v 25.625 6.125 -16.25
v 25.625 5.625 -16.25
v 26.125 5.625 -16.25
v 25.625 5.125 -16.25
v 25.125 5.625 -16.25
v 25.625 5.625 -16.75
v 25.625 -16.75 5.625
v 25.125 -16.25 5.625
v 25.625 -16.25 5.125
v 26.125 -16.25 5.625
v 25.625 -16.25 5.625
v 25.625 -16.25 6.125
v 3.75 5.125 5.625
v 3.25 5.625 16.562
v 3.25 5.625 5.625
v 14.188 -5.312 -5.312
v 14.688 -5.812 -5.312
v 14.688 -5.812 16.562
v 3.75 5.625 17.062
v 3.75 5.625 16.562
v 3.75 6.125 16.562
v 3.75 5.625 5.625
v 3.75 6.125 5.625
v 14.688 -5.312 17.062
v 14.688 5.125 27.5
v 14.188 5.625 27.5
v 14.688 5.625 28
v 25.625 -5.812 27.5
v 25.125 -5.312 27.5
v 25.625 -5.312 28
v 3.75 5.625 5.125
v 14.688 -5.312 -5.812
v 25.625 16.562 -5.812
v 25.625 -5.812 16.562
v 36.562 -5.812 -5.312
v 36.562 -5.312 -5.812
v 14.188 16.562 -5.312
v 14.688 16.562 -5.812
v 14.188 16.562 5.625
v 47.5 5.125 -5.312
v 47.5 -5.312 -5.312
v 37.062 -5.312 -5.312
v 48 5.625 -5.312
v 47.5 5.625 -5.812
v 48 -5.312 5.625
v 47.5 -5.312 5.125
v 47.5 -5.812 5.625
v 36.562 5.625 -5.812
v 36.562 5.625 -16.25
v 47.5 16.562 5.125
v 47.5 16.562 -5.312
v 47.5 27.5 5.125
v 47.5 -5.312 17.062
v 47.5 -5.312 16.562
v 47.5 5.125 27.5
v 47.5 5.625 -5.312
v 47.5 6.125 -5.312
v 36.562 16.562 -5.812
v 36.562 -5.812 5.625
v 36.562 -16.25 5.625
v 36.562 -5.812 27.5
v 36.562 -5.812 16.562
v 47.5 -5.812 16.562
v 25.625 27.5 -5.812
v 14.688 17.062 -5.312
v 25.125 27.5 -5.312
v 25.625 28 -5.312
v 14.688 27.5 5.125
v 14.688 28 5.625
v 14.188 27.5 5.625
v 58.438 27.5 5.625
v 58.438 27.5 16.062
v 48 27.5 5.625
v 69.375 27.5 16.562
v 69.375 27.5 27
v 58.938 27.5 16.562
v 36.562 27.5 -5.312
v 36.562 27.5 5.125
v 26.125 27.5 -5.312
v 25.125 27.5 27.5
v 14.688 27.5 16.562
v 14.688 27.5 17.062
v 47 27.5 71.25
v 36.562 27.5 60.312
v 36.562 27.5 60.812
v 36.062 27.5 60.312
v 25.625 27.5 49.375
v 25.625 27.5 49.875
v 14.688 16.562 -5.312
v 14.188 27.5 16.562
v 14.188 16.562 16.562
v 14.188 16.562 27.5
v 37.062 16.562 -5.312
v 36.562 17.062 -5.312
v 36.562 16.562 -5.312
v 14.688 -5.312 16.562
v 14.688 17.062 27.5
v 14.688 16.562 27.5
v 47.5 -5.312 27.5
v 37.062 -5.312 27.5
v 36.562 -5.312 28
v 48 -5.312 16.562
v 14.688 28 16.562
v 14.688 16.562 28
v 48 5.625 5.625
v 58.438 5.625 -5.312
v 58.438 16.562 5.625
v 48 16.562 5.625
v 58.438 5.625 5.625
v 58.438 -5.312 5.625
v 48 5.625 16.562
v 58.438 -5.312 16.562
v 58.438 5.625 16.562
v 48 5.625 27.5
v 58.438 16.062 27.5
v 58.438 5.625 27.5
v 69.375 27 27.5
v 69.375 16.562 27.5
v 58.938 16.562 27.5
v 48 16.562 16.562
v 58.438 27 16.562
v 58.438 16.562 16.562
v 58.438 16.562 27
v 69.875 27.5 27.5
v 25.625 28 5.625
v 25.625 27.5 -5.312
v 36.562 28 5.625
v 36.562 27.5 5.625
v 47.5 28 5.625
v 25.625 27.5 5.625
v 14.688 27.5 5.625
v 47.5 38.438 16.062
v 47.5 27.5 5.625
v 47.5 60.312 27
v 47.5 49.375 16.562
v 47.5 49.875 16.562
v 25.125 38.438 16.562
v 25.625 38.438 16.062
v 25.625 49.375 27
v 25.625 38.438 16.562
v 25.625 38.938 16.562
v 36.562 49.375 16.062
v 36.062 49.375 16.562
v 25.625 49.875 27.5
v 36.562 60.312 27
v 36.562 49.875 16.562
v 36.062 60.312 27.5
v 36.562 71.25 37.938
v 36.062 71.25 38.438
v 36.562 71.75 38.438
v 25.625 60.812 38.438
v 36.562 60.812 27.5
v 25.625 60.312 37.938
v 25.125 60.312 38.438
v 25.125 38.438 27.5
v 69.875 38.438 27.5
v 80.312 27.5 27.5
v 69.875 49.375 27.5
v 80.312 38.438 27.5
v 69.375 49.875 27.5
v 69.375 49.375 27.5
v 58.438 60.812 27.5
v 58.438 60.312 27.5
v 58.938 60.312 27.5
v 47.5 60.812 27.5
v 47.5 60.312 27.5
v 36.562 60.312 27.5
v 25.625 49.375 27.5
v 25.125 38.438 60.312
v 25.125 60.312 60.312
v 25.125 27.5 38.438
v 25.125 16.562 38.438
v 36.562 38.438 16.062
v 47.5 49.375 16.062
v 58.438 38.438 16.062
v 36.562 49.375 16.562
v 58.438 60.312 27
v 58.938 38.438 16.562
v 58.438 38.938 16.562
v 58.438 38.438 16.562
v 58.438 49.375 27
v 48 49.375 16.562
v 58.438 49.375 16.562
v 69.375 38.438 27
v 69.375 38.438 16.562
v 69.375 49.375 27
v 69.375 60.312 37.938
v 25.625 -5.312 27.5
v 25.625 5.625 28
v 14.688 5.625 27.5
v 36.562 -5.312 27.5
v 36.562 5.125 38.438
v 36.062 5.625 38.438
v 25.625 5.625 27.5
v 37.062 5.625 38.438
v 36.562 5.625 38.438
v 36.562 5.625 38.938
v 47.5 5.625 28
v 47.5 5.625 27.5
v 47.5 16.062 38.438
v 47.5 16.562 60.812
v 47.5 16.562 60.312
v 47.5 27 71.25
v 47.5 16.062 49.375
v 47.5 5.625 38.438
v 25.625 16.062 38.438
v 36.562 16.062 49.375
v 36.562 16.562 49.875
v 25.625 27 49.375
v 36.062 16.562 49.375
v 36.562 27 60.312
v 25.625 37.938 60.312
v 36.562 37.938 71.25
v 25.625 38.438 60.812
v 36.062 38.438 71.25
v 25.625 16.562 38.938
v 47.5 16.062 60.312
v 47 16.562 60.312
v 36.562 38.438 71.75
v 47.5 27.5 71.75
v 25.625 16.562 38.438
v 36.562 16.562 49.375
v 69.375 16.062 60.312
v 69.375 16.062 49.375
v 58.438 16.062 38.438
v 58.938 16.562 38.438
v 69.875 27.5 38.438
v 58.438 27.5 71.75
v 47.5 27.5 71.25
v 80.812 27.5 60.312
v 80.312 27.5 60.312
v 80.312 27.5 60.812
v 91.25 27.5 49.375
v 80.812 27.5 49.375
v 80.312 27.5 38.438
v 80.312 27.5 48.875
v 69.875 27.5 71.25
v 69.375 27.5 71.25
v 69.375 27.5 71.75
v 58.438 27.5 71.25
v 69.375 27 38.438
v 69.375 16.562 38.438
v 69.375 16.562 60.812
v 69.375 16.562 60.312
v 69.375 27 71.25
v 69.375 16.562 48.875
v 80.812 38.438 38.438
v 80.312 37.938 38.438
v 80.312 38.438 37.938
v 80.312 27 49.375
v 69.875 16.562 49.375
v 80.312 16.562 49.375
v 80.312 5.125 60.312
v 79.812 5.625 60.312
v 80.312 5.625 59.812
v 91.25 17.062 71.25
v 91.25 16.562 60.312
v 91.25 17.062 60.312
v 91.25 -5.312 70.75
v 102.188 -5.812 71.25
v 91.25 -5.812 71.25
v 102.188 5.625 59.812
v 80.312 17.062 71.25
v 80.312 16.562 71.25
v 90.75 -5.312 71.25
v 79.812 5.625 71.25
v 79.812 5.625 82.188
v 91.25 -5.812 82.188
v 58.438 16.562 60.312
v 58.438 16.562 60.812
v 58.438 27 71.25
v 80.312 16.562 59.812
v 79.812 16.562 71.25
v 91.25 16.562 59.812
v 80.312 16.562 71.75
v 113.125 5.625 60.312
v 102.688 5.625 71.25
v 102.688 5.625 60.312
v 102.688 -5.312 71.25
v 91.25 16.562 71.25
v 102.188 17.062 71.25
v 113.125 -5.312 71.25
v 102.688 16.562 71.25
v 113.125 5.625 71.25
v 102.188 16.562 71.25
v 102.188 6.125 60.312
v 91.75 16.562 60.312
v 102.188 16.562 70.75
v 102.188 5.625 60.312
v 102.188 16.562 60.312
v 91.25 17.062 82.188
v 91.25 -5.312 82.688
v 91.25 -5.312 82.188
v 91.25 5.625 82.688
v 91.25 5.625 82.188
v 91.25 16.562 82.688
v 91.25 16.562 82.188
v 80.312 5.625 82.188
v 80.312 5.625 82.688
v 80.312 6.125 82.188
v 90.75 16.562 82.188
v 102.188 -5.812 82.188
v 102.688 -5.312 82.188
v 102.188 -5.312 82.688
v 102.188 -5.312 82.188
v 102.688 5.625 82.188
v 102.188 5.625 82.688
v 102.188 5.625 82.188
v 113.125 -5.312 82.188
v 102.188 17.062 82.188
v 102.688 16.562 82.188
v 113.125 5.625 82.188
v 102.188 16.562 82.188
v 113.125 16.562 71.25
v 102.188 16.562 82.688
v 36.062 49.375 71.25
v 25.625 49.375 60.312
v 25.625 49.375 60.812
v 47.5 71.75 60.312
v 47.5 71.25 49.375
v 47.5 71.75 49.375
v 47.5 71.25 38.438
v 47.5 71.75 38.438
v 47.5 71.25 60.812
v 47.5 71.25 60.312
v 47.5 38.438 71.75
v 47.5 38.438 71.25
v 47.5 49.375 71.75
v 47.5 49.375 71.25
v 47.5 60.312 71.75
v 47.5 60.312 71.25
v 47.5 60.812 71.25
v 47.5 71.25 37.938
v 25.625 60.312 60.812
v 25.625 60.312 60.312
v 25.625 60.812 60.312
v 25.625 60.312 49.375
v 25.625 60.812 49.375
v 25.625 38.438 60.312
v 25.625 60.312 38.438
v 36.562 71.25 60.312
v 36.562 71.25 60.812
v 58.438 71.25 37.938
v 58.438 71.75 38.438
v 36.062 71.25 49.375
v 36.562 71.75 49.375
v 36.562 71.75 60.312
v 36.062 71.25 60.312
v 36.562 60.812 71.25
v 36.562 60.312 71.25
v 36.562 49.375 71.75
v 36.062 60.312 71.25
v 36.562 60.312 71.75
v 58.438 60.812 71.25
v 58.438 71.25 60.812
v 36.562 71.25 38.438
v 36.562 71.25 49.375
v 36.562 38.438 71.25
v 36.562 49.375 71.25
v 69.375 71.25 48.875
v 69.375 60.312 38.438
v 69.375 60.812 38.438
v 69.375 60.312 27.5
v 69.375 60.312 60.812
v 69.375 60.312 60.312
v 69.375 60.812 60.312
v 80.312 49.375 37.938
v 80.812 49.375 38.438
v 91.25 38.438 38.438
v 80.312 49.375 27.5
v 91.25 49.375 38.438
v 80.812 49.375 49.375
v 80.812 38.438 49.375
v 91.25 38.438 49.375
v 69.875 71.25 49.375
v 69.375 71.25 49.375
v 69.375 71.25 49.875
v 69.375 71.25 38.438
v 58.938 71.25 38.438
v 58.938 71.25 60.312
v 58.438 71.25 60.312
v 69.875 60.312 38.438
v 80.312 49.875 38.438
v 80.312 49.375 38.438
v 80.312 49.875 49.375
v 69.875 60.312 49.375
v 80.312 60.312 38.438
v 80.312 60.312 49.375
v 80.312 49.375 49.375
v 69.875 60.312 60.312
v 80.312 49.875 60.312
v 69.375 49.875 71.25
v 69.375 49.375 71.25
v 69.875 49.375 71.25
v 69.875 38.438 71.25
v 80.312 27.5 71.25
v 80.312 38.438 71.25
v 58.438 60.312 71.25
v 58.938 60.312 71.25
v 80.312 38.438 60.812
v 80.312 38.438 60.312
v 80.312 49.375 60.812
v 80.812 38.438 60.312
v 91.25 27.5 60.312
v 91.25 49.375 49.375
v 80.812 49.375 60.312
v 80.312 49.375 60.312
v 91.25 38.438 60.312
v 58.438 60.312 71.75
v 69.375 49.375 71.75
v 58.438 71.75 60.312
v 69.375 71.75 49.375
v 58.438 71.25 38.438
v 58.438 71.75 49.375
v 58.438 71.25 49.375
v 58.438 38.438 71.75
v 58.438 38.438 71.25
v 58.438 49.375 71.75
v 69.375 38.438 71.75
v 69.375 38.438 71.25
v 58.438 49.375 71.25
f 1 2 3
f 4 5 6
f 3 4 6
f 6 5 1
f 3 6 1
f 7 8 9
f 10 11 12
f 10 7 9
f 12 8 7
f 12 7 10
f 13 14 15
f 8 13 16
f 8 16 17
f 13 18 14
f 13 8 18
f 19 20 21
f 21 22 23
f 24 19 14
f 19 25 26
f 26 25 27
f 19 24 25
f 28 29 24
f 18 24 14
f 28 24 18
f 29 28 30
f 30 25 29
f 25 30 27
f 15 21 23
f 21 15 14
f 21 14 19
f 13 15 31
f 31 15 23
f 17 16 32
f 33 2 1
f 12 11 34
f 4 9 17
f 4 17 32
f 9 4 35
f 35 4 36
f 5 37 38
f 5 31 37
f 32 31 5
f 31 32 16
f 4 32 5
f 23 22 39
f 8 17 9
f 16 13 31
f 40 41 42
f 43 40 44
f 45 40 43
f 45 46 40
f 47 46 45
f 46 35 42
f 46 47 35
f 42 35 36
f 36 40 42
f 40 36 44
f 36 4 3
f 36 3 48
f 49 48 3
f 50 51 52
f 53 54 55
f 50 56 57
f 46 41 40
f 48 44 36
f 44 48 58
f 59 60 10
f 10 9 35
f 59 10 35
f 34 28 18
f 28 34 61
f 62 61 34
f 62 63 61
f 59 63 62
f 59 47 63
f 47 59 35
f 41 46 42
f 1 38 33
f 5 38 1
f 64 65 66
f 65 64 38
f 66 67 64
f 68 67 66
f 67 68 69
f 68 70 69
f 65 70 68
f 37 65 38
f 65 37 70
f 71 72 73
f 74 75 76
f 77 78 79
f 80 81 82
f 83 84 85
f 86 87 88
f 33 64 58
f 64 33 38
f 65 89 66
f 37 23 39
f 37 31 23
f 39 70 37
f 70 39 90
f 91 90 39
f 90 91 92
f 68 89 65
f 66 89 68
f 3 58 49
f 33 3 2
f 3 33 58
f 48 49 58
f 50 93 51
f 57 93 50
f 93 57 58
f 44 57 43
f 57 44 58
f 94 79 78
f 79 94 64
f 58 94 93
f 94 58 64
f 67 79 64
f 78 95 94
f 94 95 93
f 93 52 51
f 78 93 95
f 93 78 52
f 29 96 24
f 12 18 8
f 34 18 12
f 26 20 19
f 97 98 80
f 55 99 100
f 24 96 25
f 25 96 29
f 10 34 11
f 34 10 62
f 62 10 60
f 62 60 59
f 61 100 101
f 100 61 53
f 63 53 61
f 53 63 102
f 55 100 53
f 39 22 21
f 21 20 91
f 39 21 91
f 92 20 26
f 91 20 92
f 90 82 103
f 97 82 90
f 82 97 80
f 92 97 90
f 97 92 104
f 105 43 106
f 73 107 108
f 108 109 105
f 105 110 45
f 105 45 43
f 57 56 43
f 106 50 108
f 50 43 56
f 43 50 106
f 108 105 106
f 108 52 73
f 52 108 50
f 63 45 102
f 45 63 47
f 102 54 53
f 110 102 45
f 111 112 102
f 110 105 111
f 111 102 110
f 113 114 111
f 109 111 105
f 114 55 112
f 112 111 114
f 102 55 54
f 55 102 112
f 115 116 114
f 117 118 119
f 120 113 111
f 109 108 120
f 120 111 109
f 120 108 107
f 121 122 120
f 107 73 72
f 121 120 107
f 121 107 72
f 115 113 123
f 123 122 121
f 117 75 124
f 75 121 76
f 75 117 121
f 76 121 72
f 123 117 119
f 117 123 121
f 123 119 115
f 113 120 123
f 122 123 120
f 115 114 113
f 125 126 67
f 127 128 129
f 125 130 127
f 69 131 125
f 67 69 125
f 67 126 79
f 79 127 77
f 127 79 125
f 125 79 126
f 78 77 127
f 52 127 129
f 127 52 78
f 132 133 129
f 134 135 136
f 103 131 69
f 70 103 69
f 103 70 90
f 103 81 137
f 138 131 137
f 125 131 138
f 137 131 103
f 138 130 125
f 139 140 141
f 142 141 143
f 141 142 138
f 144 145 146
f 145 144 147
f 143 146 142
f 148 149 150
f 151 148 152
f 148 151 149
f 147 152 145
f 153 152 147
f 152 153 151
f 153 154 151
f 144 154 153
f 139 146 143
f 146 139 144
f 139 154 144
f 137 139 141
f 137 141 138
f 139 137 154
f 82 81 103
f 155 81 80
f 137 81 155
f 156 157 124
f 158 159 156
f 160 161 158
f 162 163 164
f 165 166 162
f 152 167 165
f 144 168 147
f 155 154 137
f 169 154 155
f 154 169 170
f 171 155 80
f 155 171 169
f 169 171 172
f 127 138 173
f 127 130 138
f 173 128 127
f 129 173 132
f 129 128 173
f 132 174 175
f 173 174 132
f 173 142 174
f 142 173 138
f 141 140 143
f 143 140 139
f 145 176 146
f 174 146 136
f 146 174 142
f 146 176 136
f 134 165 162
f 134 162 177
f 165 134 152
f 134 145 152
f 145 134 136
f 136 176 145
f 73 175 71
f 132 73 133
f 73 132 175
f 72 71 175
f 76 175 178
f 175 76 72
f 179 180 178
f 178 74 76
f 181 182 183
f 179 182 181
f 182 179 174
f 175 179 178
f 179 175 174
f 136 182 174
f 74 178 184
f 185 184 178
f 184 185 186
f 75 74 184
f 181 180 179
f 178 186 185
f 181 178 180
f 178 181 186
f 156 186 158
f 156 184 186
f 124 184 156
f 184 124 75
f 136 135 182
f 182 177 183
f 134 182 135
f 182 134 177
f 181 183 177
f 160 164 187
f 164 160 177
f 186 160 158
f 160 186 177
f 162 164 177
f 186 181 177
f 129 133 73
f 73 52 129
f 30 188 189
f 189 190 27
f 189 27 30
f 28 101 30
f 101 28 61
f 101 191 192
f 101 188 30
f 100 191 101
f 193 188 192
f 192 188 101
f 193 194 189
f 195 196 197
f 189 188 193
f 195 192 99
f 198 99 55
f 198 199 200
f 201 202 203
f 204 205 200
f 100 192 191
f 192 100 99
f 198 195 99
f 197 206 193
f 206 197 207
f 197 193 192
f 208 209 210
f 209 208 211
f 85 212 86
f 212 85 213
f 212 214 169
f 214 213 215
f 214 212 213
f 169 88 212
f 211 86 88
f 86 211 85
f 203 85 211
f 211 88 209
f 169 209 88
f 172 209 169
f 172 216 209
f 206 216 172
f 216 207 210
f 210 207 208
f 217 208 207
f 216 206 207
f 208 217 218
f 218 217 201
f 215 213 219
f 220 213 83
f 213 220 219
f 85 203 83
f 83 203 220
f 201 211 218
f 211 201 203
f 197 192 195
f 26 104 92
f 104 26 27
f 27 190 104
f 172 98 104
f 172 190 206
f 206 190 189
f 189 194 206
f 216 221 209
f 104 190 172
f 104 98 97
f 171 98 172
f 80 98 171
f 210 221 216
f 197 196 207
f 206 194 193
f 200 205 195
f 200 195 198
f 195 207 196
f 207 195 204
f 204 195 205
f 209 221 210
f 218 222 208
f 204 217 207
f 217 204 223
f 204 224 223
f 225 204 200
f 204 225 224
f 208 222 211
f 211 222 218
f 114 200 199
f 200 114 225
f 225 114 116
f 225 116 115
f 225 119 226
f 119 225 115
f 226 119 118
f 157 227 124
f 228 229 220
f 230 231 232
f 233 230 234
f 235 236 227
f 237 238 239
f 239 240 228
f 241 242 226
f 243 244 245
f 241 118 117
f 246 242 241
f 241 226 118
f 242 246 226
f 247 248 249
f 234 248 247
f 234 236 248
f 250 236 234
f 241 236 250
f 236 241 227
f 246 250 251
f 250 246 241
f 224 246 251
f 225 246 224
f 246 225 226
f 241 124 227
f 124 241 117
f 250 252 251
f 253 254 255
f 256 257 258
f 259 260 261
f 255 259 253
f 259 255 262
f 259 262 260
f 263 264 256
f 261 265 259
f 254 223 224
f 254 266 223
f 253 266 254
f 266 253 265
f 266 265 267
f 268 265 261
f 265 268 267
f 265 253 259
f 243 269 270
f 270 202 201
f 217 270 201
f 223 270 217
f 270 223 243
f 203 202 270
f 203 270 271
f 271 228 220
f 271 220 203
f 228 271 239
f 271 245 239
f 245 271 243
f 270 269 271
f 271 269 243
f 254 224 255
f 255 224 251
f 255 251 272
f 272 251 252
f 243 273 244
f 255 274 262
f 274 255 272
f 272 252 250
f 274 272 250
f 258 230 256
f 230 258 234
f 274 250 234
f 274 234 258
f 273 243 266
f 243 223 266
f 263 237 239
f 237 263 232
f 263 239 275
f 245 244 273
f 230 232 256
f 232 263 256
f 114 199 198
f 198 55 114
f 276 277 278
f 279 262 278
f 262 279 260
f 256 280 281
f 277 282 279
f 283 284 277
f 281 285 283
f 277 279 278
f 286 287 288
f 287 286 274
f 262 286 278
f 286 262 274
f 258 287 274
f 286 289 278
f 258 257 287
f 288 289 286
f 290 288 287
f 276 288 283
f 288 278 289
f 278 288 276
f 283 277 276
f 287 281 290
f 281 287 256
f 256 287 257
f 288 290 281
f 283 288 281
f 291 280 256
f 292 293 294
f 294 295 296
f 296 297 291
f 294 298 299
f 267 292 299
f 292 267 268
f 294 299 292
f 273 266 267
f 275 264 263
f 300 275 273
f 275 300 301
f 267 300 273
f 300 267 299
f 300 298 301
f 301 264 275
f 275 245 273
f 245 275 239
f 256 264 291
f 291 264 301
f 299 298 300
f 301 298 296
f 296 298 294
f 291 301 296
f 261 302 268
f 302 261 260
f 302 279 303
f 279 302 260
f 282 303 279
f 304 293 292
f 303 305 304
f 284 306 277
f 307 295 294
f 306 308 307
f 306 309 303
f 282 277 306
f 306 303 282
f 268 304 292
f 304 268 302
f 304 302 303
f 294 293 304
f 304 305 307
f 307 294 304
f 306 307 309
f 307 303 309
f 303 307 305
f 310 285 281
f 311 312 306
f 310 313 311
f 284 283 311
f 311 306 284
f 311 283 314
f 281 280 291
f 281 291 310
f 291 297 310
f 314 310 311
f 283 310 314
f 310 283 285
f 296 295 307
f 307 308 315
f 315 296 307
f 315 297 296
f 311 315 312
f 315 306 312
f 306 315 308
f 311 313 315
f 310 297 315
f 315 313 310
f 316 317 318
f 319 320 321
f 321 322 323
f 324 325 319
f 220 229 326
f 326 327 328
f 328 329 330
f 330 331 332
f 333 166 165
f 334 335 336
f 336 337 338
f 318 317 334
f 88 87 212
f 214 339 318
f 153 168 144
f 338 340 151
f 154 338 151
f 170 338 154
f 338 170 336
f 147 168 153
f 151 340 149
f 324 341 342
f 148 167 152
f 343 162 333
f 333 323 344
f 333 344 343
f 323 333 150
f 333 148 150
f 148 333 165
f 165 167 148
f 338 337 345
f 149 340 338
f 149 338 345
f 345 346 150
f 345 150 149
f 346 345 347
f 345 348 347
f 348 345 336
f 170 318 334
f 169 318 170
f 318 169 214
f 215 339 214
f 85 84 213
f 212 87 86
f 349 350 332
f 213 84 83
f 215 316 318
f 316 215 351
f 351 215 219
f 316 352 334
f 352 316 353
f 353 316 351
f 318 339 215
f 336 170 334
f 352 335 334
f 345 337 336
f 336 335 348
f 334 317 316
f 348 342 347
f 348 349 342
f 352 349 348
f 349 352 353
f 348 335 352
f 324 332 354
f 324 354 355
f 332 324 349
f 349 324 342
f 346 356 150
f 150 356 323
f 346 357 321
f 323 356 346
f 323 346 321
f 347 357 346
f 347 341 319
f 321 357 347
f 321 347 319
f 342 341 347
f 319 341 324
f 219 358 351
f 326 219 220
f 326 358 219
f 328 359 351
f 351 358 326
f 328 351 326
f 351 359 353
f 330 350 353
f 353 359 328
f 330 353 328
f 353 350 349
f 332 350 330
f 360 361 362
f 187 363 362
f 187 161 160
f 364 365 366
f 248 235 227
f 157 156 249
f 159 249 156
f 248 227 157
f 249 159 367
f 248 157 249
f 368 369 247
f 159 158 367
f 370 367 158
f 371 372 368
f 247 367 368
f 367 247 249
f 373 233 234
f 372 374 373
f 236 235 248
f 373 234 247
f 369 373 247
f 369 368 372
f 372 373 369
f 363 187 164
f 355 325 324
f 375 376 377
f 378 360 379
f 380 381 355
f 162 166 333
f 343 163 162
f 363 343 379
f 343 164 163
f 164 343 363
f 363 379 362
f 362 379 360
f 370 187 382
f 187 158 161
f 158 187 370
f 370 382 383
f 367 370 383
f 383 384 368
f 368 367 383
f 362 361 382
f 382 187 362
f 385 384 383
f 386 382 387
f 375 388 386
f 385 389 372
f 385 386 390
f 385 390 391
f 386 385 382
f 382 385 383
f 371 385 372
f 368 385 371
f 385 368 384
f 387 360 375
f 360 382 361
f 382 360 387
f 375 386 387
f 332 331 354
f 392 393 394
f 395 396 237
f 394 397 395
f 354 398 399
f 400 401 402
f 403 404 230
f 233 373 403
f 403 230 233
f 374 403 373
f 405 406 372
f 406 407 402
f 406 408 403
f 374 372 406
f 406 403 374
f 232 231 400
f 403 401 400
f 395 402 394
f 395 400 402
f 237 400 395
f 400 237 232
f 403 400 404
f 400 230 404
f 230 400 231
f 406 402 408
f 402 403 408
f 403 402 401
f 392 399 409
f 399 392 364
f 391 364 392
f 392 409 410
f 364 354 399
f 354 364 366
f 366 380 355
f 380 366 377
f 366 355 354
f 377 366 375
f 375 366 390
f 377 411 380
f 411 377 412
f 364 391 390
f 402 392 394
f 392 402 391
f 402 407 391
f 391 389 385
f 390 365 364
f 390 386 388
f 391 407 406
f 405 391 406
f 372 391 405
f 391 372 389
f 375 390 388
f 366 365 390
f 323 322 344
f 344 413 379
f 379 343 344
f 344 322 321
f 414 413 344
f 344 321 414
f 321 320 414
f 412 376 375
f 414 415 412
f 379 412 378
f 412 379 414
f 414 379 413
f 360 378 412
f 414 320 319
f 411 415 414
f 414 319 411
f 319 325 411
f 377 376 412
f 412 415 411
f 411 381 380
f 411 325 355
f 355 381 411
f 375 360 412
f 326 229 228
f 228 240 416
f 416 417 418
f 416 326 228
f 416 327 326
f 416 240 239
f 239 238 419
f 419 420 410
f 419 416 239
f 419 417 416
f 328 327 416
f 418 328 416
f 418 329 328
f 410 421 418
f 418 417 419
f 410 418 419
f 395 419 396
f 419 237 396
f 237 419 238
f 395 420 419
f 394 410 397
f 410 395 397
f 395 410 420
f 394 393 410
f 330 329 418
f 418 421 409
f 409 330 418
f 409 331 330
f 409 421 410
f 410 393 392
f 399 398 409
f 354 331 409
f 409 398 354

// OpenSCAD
/*
SomeBalls.scad
Public Domain Code
Based on Metaballs By: William A Adams 	4 June 2011

This code is a simplified implementation of the 'metaball' and uses "Marching Cubes" to register the isosurface which is the interaction of the various balls. All Cubes are tested and a joint hull is generated of each corner that lies inside the threshold  of the metaball 

Future work : 
For obvious reasons linearly interpolated marching cubes. 
A more elegant cube solution than just hulling corners. 
Cube subdivision for speed up.

*/
Resolution = 15;
MinSubdivisions=4; // 
// Smaller number larger blob
Threshold = 1.65;// Smaller number larger blob
Diagnostic=false;
Oversize=0.2;
// List Format [[x,y,z,r],[x,y,z,r]]
MyBallList=[[50, 50, 50, 35],[25, 5, 5, 25],[95, 5, 75, 15]];//
DrawMetaballs(MyBallList);


module DrawMetaballs(BallList) {
// boundary plus some extra
size=max(findMax(BallList, 0),findMax(BallList, 1),findMax(BallList,2));
DrawSubMetaballs(BallList,findMin(BallList, 0)-(size*Oversize),findMin(BallList, 1)-(size*Oversize),findMin(BallList, 2)-(size*Oversize),size*(Oversize*2+1)); 
    


 }
module DrawSubMetaballs(BallList,x,y,z,Size,i=0) {    
    echo(i,Size);
union(){
suma = BallField3D(x, y, z, BallList, len(BallList) - 1);
sumb = BallField3D(x + Size, y, z, BallList, len(BallList) - 1);
sumc = BallField3D(x, y + Size, z, BallList, len(BallList) - 1);
sumd = BallField3D(x + Size, y + Size, z, BallList, len(BallList) - 1);
sume = BallField3D(x, y, z + Size, BallList, len(BallList) - 1);
sumf = BallField3D(x + Size, y, z + Size, BallList, len(BallList) - 1);
sumg = BallField3D(x, y + Size, z + Size, BallList, len(BallList) - 1);
sumh = BallField3D(x + Size, y + Size, z + Size, BallList, len(BallList) - 1);
// test for empty and full Cubes
AB=Size;

if (Size>pow(Resolution, MinSubdivisions)||i<MinSubdivisions) { 
    h=Size*0.5  ;
    DrawSubMetaballs(BallList,x,y,z,h,i+1);
    DrawSubMetaballs(BallList,x+h,y,z,h,i+1);
    DrawSubMetaballs(BallList,x,y+h,z,h,i+1);
    DrawSubMetaballs(BallList,x+h,y+h,z,h,i+1);
    
    DrawSubMetaballs(BallList,x,y,z+h,h,i+1);
    DrawSubMetaballs(BallList,x+h,y,z+h,h,i+1);
    DrawSubMetaballs(BallList,x,y+h,z+h,h,i+1);
    DrawSubMetaballs(BallList,x+h,y+h,z+h,h,i+1);
    
    }else {
    
if (  suma <= Threshold && sumb <= Threshold && sumc <= Threshold && sumd <= Threshold && sume <= Threshold && sumf <= Threshold && sumg <= Threshold && sumh <= Threshold) {if (Diagnostic){translate([x, y, z]) %cube(Size);}} 
else if ( suma > Threshold && sumb > Threshold && sumc > Threshold && sumd > Threshold && sume > Threshold && sumf > Threshold && sumg > Threshold && sumh > Threshold) {
translate([x, y, z]) cube(Size);} 


else if(Size>Resolution){ 
    h=Size*0.5  ;
    DrawSubMetaballs(BallList,x,y,z,h,i+1);
    DrawSubMetaballs(BallList,x+h,y,z,h,i+1);
    DrawSubMetaballs(BallList,x,y+h,z,h,i+1);
    DrawSubMetaballs(BallList,x+h,y+h,z,h,i+1);
    
    DrawSubMetaballs(BallList,x,y,z+h,h,i+1);
    DrawSubMetaballs(BallList,x+h,y,z+h,h,i+1);
    DrawSubMetaballs(BallList,x,y+h,z+h,h,i+1);
    DrawSubMetaballs(BallList,x+h,y+h,z+h,h,i+1);}
else { 
    
    // For every corner inside treshold make and rotate a corner piece, hull the lot.
 color(rndc())hull() {
if (suma > Threshold){
    translate([x, y, z]) rotate([0, 0, 0]) Corner(AB,0,0);}
if (sumb > Threshold){
    translate([x + Size, y, z]) rotate([0, 0, 90]) Corner();}
if (sumc > Threshold){
    translate([x, y + Size, z]) rotate([0, 0, -90]) Corner();}
if (sumd > Threshold){
    translate([x + Size, y + Size, z]) rotate([0, 0, 180])Corner();}
    
if (sume > Threshold){
    translate([x, y, z + Size]) mirror([0, 0, 1]) rotate([0, 0, 0]) Corner();}
if (sumf > Threshold){
    translate([x + Size, y, z + Size]) mirror([0, 0, 1]) rotate([0, 0, 90]) Corner();}
if (sumg > Threshold){
    translate([x, y + Size, z + Size]) mirror([0, 0, 1]) rotate([0, 0, -90]) Corner();}
if (sumh > Threshold){
    translate([x + Size, y + Size, z + Size]) mirror([0, 0, 1]) rotate([0, 0, 180]) Corner();}}
    }
}}}
//Corner piece
module Corner(u=0.5,v=0.5,w=0.5) {scale([u,v,w])
polyhedron
    (points = [
	       [0,0,0],[1,0,0],[0,1,0],[0,0,1],], 
     faces = [
		  [0,0,1],[0,0,2],[0,0,3],[1,2,3]
		  ]
     );}
//Field function
function Powerball(x, y, z, Ball) = (Ball[3] / sqrt((x - Ball[0]) * (x - Ball[0]) + (y - Ball[1]) * (y - Ball[1]) + (z - Ball[2]) * (z - Ball[2])));
// Recursive Field Evaluation
function BallField3D(x, y, z, BallSack, i) = (i == 0) ? Powerball(x, y, z, BallSack[0]): Powerball(x, y, z, BallSack[i]) + BallField3D(x, y, z, BallSack, i - 1);
// Random color
function rndc() = [rands(0, 1, 1)[0], rands(0, 1, 1)[0], rands(0, 1, 1)[0]];
// Recursive find min/max extremes
function findMax(v, select, i = 0) = ((i + 1) < len(v)) ? max(v[i][select] + v[i][3] + Resolution, findMax(v, select, i + 1)): v[i][select] + v[i][3] + Resolution;
function findMin(v, select, i = 0) = ((i + 1) < len(v)) ? min(v[i][select] - v[i][3] - Resolution, findMin(v, select, i + 1)): v[i][select] - v[i][3] - Resolution;
